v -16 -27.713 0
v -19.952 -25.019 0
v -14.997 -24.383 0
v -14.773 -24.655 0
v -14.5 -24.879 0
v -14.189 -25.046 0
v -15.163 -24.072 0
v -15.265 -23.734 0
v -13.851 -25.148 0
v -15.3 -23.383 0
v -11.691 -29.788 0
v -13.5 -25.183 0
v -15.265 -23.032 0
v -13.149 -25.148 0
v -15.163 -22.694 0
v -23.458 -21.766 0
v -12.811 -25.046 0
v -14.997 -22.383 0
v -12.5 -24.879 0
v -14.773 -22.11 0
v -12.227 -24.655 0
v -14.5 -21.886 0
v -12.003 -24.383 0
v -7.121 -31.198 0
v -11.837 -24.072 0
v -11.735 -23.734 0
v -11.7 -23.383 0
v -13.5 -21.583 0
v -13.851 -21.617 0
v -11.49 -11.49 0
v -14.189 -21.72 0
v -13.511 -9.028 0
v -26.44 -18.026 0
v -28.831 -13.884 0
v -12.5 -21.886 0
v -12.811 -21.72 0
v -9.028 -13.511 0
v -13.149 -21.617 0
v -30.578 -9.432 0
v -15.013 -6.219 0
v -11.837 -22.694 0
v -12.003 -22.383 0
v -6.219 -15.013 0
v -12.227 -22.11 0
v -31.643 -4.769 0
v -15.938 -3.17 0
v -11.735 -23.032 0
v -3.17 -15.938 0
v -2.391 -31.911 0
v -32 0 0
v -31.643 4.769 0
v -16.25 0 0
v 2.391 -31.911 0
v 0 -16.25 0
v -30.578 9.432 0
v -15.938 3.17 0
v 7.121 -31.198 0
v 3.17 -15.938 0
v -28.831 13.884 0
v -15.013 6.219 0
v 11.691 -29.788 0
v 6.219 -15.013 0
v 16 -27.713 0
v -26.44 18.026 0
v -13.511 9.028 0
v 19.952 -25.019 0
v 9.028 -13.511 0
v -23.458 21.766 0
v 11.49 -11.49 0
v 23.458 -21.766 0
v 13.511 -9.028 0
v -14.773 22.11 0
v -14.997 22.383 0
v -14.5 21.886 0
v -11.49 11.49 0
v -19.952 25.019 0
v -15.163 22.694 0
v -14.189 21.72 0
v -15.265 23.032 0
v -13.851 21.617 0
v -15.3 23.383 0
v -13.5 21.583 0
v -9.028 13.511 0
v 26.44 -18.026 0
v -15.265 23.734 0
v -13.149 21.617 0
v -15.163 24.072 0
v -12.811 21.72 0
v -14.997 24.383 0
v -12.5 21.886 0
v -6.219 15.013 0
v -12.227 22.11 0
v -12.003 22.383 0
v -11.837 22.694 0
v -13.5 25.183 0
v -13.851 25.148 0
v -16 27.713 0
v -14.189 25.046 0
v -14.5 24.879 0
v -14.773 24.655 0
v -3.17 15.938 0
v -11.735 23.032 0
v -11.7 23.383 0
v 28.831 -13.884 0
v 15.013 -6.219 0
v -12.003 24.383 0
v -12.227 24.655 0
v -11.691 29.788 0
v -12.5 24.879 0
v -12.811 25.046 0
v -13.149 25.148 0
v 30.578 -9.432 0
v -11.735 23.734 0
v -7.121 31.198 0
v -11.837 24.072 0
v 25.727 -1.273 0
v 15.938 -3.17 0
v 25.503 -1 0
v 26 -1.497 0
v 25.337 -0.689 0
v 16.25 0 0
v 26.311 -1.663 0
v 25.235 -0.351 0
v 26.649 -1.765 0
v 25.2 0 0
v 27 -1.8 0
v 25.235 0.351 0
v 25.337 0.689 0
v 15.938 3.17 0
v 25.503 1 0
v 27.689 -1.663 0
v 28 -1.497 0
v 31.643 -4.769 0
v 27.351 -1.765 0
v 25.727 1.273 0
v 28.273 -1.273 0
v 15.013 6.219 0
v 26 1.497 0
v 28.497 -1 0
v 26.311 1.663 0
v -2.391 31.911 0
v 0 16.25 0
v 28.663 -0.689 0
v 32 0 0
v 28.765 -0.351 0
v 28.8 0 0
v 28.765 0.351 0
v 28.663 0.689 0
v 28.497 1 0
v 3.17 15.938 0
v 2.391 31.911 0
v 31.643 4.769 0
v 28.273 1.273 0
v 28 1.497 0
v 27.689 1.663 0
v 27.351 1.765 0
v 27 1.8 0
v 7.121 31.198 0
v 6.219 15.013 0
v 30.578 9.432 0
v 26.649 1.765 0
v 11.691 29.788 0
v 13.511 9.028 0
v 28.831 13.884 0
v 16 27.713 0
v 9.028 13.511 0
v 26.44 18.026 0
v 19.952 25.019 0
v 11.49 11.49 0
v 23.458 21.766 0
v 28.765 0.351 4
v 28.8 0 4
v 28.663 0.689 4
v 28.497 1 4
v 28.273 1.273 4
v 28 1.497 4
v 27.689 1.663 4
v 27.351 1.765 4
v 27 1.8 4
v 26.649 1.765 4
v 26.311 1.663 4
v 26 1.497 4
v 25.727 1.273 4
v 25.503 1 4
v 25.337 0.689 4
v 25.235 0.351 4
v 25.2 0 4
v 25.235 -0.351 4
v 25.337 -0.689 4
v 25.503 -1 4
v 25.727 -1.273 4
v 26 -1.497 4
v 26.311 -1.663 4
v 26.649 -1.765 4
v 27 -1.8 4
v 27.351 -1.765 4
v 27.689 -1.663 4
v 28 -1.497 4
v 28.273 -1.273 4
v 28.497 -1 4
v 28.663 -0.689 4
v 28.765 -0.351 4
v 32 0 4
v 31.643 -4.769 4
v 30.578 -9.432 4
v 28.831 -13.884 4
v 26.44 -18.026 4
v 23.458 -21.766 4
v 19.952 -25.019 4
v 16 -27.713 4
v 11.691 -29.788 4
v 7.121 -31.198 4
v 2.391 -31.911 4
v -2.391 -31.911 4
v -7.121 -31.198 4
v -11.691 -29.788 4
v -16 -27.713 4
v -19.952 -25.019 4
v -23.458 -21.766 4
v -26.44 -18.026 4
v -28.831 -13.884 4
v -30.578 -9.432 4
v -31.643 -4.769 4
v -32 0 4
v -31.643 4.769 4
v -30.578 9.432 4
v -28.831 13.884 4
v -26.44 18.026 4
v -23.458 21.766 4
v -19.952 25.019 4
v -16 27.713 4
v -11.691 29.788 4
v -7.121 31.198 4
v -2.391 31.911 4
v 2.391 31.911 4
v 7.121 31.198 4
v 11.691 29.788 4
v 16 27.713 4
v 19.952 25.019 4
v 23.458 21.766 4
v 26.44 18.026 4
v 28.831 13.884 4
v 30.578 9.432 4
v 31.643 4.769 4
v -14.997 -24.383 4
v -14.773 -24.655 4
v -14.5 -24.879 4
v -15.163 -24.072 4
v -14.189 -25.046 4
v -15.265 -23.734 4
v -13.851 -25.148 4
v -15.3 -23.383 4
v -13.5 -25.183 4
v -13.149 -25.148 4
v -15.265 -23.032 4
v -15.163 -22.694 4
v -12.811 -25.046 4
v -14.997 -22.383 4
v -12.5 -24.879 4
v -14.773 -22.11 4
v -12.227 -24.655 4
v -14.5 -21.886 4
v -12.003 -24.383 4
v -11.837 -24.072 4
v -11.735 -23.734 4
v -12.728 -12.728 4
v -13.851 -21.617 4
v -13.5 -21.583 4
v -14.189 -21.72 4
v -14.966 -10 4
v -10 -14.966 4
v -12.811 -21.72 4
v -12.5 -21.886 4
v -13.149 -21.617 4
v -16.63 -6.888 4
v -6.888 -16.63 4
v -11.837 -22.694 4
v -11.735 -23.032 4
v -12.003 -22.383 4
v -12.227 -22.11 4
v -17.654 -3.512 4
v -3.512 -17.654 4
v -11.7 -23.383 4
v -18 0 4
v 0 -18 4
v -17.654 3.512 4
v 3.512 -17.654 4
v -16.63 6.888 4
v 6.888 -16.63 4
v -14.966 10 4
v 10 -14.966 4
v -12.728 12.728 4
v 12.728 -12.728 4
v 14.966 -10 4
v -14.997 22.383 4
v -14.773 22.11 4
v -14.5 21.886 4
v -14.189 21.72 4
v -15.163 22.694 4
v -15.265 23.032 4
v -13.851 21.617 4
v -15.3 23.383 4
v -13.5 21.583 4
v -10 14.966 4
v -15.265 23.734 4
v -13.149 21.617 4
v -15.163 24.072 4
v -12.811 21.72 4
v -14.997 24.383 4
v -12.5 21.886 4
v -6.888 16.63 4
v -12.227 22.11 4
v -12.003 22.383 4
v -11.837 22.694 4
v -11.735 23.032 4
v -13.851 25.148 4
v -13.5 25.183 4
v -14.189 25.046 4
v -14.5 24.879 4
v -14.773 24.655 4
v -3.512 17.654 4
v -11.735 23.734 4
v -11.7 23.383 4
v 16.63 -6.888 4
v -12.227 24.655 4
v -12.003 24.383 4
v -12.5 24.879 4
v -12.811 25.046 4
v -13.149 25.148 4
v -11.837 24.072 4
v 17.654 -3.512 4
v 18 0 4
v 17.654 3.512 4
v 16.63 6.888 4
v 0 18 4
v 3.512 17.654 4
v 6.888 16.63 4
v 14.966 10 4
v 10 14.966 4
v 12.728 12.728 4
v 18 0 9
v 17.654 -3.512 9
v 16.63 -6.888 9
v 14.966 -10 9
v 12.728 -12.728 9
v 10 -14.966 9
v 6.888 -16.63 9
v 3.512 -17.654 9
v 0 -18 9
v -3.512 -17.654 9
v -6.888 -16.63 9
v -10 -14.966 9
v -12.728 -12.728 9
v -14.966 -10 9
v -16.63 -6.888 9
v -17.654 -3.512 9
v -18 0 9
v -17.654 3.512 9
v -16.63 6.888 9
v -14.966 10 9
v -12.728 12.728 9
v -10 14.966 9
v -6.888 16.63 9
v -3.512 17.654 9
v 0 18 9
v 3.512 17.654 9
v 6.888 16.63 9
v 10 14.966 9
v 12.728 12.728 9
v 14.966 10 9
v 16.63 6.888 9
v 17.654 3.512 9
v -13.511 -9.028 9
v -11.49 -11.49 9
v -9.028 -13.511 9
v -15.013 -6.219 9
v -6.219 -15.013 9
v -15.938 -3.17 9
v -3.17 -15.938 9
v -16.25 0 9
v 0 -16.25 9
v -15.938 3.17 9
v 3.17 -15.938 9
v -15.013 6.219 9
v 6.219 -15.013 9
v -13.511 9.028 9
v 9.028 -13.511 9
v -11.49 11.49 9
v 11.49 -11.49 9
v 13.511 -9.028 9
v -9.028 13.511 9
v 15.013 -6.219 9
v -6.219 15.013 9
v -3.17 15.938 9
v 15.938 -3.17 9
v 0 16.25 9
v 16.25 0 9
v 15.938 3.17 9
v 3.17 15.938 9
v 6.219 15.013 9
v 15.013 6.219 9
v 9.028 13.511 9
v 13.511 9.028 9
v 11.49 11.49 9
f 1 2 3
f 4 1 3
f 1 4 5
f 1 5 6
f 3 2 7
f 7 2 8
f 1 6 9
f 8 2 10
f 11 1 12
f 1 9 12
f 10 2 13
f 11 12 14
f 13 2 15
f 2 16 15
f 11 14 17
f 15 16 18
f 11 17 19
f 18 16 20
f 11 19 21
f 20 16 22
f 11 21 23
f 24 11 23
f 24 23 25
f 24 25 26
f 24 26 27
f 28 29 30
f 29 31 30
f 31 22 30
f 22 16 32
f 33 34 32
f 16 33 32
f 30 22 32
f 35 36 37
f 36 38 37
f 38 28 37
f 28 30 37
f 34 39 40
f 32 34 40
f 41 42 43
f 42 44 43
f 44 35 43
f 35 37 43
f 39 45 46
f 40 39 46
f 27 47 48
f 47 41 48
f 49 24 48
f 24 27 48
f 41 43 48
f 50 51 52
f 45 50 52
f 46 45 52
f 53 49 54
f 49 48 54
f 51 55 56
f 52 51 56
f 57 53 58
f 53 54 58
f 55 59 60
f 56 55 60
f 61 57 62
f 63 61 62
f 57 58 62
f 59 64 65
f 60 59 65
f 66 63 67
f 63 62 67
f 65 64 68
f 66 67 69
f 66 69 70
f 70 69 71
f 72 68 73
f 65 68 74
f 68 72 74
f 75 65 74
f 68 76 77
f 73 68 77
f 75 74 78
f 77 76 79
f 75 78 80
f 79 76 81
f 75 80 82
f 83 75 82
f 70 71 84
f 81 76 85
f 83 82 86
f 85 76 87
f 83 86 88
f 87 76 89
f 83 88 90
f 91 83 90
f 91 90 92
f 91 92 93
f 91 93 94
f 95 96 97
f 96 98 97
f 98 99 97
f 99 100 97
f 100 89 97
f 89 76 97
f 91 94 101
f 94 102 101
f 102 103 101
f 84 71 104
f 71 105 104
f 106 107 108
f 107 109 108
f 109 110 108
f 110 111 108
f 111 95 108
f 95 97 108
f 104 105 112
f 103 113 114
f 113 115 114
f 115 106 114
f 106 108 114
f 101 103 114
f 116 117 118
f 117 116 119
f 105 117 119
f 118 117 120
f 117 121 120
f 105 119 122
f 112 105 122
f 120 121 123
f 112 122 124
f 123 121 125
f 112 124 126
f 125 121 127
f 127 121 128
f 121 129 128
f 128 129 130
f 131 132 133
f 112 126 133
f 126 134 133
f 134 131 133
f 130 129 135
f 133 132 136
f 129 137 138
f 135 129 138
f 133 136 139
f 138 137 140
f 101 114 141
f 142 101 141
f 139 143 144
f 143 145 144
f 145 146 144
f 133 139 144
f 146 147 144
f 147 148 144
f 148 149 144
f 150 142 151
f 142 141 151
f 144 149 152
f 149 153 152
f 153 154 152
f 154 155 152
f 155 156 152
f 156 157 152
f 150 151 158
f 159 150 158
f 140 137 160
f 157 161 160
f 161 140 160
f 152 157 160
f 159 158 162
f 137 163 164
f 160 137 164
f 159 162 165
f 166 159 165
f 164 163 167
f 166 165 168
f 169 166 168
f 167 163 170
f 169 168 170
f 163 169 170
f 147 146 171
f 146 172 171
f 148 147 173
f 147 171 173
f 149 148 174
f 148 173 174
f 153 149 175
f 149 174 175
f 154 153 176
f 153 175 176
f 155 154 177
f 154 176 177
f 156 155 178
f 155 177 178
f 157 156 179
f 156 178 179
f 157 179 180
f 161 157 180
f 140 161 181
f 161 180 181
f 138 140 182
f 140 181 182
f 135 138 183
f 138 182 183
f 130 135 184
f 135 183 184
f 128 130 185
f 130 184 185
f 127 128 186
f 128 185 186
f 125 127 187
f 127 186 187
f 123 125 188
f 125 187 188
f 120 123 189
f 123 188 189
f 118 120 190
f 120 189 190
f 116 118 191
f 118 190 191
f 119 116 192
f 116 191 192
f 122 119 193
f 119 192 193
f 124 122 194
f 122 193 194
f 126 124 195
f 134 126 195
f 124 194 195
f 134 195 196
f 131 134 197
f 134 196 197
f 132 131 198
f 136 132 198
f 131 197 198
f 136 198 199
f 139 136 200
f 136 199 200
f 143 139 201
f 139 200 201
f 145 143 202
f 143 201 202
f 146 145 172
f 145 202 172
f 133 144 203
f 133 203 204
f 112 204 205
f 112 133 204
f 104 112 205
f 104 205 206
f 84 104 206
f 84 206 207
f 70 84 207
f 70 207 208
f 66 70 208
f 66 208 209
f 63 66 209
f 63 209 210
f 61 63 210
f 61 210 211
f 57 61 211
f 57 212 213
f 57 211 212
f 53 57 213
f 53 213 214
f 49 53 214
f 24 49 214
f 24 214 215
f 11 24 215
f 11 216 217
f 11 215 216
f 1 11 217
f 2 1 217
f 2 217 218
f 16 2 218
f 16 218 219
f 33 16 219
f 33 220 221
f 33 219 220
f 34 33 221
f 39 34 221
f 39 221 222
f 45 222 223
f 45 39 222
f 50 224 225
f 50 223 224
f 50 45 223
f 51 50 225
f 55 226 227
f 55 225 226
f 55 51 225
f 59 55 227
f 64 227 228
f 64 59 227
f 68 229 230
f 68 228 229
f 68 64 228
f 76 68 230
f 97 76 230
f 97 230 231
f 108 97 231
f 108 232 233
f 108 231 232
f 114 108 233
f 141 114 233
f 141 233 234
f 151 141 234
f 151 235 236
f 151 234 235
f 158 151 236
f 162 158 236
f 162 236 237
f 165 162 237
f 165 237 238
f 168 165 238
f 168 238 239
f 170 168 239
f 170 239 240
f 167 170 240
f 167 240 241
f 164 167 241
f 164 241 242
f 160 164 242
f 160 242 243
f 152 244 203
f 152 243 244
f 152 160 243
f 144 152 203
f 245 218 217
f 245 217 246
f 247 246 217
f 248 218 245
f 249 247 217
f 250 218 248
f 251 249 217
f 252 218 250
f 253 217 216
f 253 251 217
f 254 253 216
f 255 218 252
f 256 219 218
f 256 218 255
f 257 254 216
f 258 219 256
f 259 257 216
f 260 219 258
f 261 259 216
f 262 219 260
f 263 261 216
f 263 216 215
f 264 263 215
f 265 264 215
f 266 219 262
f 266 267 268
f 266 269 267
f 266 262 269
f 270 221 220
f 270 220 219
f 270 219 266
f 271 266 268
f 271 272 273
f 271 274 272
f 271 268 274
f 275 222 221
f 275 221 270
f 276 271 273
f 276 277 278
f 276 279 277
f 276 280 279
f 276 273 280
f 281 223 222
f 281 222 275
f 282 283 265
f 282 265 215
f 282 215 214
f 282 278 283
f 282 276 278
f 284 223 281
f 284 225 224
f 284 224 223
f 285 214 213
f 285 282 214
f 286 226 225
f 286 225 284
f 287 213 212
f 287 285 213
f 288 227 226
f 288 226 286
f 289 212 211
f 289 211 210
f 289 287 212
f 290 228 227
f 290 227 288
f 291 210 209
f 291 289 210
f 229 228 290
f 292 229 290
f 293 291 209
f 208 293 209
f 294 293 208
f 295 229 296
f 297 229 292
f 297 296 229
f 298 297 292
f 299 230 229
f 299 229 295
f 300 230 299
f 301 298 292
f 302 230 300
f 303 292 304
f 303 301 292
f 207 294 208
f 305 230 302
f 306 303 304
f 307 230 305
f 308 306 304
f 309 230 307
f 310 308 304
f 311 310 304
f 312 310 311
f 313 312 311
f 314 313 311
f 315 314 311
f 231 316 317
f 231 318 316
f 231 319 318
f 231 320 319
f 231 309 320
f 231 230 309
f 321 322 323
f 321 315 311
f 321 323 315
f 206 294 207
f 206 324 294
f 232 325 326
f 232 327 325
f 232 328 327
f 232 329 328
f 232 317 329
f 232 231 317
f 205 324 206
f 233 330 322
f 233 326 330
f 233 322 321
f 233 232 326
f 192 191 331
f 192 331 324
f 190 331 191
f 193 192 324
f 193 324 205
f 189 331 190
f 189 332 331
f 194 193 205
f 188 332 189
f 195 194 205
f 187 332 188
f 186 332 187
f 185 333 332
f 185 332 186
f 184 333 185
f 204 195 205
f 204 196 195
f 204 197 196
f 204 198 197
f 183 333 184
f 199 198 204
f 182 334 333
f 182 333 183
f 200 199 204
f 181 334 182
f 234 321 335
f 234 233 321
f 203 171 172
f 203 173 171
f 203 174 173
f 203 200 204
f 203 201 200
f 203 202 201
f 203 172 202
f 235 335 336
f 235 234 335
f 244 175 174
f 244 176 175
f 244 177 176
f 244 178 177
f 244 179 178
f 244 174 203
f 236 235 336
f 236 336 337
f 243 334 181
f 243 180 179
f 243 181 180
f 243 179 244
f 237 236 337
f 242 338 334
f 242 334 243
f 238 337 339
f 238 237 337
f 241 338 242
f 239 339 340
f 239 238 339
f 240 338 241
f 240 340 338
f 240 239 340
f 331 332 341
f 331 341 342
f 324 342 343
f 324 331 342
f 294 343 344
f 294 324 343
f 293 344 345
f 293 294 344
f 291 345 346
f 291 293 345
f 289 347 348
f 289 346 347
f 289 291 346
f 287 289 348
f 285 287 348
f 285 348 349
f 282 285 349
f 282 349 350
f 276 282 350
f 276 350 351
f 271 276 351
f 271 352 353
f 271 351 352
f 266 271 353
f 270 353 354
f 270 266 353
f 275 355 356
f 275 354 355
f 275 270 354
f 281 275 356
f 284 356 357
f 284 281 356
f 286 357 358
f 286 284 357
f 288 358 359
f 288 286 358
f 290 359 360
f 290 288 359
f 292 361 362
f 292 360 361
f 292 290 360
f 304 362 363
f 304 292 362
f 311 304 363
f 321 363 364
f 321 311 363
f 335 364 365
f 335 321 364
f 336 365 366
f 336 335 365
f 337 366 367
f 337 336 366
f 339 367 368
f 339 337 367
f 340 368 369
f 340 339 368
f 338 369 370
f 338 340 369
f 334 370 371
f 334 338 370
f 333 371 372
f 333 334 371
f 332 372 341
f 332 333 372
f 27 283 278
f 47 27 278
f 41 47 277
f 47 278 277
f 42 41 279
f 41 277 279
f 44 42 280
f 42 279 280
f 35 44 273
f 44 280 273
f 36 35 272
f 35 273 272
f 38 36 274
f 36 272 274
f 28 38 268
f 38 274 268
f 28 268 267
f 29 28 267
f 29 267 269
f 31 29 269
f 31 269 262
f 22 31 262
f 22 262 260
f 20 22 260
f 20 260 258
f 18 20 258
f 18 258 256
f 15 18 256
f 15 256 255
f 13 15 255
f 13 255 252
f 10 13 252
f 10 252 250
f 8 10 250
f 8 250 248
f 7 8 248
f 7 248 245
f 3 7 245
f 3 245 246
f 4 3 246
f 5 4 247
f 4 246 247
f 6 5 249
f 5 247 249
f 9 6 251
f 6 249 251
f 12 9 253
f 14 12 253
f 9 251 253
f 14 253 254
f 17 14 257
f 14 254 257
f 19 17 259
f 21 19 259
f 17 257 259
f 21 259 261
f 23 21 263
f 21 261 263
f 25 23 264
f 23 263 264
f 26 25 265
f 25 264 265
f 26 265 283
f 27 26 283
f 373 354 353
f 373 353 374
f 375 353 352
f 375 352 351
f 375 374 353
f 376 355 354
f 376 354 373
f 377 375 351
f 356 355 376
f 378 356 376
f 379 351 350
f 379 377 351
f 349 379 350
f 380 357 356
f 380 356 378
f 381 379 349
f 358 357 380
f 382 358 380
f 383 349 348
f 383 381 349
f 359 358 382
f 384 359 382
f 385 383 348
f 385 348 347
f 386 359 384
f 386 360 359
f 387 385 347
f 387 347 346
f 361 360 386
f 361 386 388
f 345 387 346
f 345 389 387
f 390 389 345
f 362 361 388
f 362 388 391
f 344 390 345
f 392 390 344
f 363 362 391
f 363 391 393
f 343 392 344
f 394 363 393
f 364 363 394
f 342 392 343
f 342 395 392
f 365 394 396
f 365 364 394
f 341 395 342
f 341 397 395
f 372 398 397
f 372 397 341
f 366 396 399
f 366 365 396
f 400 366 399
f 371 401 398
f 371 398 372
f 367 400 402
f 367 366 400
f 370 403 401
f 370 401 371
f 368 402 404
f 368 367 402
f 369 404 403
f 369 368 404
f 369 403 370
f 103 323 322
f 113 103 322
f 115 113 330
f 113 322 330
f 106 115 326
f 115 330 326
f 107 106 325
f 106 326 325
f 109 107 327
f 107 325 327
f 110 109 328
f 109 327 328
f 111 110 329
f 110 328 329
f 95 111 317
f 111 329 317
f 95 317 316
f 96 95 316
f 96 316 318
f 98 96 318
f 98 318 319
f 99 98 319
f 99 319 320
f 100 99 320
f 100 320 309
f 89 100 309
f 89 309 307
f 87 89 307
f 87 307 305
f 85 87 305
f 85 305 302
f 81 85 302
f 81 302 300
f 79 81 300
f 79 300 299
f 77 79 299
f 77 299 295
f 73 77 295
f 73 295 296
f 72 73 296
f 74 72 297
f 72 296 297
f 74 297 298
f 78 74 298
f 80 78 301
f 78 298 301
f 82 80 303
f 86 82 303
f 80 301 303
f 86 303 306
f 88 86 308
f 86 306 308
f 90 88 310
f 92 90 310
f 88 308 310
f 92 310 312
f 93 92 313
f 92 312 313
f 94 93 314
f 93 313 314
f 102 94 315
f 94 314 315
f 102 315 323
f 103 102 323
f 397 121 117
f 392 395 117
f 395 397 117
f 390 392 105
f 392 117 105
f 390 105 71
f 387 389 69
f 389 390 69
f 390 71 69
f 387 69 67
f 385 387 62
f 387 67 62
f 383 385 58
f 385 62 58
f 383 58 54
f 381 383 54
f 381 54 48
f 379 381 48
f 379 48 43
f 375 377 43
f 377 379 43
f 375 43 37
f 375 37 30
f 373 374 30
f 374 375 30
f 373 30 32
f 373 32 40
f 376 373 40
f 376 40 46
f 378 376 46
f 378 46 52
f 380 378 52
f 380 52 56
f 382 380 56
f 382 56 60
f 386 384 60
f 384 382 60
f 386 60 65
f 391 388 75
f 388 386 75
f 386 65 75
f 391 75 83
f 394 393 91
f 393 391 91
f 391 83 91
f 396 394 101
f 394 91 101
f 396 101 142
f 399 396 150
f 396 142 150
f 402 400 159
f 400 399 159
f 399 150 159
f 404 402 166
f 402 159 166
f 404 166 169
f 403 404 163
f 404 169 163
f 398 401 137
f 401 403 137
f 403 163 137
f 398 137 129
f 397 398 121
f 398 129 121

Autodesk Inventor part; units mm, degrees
ref_plane "YZ Plane" through (0, 0, 0) normal (1, 0, 0) x (0, 1, 0)
ref_plane "XZ Plane" through (0, 0, 0) normal (0, 1, 0) x (-1, 0, 0)
ref_plane "XY Plane" through (0, 0, 0) normal (0, 0, 1) x (1, 0, 0)
sketch "Sketch1" plane through (0, 0, 0) normal (0, 0, 1) x (1, 0, 0)
  circle A0 centre (0, 0) radius 16.25
  circle A1 centre (0, 0) radius 18
  circle A2 centre (0, 0) radius 32
  dimension "d0" = 32.5
  dimension "d16" = 64
  dimension "d21" = 36
extrude "Extrusion1" add sketch "Sketch1" along normal blind 4 contours A2
extrude "Extrusion2" add sketch "Sketch1" along normal blind 9 contours A1
sketch "Sketch2" plane through (0, 0, 4) normal (0, 0, 1) x (1, 0, 0)
  circle A0 centre (0, 0) radius 32 projected
  circle A1 centre (27, 0) radius 1.8
  circle A2 centre (-13.5, 23.3827) radius 1.8
  circle A3 centre (-13.5, -23.3827) radius 1.8
  dimension "d8" = 3.6
  dimension "d9" = 27
  dimension "d12" = 360
extrude "Extrusion3" cut sketch "Sketch2" against normal up to surface (4 mm away) contours A1 | A2 | A3
equation "\"d0\" = a"
equation "\"a\" = 32.5"
properties part number "ACO.RODA15-02"
